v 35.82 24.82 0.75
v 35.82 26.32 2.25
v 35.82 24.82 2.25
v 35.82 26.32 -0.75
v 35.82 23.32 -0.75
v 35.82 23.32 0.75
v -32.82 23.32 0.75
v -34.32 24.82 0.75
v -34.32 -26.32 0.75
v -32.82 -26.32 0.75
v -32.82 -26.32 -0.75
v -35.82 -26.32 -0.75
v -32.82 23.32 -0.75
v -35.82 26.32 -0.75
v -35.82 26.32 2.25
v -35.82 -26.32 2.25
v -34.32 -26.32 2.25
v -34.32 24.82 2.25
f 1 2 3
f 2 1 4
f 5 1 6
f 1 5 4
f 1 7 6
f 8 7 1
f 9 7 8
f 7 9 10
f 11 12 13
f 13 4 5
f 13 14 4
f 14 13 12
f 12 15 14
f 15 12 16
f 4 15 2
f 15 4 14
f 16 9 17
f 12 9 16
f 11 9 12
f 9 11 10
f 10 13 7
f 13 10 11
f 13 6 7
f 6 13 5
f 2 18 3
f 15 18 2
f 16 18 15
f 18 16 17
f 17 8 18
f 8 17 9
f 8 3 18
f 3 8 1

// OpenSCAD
t = 1.5;
pitch = 2.5;

x = 70.14;
y = 51.14;

difference(){
    cube([x + t, y + t, t], center=true);
    translate([t, -t, 0])
    cube([x - t, y-t, t], center=true);
}

translate([0, 0, t])
difference(){
    cube([x + t, y + t, t], center=true);
    translate([t/2, -t/2, 0])
    cube([x, y, t], center=true);
}
